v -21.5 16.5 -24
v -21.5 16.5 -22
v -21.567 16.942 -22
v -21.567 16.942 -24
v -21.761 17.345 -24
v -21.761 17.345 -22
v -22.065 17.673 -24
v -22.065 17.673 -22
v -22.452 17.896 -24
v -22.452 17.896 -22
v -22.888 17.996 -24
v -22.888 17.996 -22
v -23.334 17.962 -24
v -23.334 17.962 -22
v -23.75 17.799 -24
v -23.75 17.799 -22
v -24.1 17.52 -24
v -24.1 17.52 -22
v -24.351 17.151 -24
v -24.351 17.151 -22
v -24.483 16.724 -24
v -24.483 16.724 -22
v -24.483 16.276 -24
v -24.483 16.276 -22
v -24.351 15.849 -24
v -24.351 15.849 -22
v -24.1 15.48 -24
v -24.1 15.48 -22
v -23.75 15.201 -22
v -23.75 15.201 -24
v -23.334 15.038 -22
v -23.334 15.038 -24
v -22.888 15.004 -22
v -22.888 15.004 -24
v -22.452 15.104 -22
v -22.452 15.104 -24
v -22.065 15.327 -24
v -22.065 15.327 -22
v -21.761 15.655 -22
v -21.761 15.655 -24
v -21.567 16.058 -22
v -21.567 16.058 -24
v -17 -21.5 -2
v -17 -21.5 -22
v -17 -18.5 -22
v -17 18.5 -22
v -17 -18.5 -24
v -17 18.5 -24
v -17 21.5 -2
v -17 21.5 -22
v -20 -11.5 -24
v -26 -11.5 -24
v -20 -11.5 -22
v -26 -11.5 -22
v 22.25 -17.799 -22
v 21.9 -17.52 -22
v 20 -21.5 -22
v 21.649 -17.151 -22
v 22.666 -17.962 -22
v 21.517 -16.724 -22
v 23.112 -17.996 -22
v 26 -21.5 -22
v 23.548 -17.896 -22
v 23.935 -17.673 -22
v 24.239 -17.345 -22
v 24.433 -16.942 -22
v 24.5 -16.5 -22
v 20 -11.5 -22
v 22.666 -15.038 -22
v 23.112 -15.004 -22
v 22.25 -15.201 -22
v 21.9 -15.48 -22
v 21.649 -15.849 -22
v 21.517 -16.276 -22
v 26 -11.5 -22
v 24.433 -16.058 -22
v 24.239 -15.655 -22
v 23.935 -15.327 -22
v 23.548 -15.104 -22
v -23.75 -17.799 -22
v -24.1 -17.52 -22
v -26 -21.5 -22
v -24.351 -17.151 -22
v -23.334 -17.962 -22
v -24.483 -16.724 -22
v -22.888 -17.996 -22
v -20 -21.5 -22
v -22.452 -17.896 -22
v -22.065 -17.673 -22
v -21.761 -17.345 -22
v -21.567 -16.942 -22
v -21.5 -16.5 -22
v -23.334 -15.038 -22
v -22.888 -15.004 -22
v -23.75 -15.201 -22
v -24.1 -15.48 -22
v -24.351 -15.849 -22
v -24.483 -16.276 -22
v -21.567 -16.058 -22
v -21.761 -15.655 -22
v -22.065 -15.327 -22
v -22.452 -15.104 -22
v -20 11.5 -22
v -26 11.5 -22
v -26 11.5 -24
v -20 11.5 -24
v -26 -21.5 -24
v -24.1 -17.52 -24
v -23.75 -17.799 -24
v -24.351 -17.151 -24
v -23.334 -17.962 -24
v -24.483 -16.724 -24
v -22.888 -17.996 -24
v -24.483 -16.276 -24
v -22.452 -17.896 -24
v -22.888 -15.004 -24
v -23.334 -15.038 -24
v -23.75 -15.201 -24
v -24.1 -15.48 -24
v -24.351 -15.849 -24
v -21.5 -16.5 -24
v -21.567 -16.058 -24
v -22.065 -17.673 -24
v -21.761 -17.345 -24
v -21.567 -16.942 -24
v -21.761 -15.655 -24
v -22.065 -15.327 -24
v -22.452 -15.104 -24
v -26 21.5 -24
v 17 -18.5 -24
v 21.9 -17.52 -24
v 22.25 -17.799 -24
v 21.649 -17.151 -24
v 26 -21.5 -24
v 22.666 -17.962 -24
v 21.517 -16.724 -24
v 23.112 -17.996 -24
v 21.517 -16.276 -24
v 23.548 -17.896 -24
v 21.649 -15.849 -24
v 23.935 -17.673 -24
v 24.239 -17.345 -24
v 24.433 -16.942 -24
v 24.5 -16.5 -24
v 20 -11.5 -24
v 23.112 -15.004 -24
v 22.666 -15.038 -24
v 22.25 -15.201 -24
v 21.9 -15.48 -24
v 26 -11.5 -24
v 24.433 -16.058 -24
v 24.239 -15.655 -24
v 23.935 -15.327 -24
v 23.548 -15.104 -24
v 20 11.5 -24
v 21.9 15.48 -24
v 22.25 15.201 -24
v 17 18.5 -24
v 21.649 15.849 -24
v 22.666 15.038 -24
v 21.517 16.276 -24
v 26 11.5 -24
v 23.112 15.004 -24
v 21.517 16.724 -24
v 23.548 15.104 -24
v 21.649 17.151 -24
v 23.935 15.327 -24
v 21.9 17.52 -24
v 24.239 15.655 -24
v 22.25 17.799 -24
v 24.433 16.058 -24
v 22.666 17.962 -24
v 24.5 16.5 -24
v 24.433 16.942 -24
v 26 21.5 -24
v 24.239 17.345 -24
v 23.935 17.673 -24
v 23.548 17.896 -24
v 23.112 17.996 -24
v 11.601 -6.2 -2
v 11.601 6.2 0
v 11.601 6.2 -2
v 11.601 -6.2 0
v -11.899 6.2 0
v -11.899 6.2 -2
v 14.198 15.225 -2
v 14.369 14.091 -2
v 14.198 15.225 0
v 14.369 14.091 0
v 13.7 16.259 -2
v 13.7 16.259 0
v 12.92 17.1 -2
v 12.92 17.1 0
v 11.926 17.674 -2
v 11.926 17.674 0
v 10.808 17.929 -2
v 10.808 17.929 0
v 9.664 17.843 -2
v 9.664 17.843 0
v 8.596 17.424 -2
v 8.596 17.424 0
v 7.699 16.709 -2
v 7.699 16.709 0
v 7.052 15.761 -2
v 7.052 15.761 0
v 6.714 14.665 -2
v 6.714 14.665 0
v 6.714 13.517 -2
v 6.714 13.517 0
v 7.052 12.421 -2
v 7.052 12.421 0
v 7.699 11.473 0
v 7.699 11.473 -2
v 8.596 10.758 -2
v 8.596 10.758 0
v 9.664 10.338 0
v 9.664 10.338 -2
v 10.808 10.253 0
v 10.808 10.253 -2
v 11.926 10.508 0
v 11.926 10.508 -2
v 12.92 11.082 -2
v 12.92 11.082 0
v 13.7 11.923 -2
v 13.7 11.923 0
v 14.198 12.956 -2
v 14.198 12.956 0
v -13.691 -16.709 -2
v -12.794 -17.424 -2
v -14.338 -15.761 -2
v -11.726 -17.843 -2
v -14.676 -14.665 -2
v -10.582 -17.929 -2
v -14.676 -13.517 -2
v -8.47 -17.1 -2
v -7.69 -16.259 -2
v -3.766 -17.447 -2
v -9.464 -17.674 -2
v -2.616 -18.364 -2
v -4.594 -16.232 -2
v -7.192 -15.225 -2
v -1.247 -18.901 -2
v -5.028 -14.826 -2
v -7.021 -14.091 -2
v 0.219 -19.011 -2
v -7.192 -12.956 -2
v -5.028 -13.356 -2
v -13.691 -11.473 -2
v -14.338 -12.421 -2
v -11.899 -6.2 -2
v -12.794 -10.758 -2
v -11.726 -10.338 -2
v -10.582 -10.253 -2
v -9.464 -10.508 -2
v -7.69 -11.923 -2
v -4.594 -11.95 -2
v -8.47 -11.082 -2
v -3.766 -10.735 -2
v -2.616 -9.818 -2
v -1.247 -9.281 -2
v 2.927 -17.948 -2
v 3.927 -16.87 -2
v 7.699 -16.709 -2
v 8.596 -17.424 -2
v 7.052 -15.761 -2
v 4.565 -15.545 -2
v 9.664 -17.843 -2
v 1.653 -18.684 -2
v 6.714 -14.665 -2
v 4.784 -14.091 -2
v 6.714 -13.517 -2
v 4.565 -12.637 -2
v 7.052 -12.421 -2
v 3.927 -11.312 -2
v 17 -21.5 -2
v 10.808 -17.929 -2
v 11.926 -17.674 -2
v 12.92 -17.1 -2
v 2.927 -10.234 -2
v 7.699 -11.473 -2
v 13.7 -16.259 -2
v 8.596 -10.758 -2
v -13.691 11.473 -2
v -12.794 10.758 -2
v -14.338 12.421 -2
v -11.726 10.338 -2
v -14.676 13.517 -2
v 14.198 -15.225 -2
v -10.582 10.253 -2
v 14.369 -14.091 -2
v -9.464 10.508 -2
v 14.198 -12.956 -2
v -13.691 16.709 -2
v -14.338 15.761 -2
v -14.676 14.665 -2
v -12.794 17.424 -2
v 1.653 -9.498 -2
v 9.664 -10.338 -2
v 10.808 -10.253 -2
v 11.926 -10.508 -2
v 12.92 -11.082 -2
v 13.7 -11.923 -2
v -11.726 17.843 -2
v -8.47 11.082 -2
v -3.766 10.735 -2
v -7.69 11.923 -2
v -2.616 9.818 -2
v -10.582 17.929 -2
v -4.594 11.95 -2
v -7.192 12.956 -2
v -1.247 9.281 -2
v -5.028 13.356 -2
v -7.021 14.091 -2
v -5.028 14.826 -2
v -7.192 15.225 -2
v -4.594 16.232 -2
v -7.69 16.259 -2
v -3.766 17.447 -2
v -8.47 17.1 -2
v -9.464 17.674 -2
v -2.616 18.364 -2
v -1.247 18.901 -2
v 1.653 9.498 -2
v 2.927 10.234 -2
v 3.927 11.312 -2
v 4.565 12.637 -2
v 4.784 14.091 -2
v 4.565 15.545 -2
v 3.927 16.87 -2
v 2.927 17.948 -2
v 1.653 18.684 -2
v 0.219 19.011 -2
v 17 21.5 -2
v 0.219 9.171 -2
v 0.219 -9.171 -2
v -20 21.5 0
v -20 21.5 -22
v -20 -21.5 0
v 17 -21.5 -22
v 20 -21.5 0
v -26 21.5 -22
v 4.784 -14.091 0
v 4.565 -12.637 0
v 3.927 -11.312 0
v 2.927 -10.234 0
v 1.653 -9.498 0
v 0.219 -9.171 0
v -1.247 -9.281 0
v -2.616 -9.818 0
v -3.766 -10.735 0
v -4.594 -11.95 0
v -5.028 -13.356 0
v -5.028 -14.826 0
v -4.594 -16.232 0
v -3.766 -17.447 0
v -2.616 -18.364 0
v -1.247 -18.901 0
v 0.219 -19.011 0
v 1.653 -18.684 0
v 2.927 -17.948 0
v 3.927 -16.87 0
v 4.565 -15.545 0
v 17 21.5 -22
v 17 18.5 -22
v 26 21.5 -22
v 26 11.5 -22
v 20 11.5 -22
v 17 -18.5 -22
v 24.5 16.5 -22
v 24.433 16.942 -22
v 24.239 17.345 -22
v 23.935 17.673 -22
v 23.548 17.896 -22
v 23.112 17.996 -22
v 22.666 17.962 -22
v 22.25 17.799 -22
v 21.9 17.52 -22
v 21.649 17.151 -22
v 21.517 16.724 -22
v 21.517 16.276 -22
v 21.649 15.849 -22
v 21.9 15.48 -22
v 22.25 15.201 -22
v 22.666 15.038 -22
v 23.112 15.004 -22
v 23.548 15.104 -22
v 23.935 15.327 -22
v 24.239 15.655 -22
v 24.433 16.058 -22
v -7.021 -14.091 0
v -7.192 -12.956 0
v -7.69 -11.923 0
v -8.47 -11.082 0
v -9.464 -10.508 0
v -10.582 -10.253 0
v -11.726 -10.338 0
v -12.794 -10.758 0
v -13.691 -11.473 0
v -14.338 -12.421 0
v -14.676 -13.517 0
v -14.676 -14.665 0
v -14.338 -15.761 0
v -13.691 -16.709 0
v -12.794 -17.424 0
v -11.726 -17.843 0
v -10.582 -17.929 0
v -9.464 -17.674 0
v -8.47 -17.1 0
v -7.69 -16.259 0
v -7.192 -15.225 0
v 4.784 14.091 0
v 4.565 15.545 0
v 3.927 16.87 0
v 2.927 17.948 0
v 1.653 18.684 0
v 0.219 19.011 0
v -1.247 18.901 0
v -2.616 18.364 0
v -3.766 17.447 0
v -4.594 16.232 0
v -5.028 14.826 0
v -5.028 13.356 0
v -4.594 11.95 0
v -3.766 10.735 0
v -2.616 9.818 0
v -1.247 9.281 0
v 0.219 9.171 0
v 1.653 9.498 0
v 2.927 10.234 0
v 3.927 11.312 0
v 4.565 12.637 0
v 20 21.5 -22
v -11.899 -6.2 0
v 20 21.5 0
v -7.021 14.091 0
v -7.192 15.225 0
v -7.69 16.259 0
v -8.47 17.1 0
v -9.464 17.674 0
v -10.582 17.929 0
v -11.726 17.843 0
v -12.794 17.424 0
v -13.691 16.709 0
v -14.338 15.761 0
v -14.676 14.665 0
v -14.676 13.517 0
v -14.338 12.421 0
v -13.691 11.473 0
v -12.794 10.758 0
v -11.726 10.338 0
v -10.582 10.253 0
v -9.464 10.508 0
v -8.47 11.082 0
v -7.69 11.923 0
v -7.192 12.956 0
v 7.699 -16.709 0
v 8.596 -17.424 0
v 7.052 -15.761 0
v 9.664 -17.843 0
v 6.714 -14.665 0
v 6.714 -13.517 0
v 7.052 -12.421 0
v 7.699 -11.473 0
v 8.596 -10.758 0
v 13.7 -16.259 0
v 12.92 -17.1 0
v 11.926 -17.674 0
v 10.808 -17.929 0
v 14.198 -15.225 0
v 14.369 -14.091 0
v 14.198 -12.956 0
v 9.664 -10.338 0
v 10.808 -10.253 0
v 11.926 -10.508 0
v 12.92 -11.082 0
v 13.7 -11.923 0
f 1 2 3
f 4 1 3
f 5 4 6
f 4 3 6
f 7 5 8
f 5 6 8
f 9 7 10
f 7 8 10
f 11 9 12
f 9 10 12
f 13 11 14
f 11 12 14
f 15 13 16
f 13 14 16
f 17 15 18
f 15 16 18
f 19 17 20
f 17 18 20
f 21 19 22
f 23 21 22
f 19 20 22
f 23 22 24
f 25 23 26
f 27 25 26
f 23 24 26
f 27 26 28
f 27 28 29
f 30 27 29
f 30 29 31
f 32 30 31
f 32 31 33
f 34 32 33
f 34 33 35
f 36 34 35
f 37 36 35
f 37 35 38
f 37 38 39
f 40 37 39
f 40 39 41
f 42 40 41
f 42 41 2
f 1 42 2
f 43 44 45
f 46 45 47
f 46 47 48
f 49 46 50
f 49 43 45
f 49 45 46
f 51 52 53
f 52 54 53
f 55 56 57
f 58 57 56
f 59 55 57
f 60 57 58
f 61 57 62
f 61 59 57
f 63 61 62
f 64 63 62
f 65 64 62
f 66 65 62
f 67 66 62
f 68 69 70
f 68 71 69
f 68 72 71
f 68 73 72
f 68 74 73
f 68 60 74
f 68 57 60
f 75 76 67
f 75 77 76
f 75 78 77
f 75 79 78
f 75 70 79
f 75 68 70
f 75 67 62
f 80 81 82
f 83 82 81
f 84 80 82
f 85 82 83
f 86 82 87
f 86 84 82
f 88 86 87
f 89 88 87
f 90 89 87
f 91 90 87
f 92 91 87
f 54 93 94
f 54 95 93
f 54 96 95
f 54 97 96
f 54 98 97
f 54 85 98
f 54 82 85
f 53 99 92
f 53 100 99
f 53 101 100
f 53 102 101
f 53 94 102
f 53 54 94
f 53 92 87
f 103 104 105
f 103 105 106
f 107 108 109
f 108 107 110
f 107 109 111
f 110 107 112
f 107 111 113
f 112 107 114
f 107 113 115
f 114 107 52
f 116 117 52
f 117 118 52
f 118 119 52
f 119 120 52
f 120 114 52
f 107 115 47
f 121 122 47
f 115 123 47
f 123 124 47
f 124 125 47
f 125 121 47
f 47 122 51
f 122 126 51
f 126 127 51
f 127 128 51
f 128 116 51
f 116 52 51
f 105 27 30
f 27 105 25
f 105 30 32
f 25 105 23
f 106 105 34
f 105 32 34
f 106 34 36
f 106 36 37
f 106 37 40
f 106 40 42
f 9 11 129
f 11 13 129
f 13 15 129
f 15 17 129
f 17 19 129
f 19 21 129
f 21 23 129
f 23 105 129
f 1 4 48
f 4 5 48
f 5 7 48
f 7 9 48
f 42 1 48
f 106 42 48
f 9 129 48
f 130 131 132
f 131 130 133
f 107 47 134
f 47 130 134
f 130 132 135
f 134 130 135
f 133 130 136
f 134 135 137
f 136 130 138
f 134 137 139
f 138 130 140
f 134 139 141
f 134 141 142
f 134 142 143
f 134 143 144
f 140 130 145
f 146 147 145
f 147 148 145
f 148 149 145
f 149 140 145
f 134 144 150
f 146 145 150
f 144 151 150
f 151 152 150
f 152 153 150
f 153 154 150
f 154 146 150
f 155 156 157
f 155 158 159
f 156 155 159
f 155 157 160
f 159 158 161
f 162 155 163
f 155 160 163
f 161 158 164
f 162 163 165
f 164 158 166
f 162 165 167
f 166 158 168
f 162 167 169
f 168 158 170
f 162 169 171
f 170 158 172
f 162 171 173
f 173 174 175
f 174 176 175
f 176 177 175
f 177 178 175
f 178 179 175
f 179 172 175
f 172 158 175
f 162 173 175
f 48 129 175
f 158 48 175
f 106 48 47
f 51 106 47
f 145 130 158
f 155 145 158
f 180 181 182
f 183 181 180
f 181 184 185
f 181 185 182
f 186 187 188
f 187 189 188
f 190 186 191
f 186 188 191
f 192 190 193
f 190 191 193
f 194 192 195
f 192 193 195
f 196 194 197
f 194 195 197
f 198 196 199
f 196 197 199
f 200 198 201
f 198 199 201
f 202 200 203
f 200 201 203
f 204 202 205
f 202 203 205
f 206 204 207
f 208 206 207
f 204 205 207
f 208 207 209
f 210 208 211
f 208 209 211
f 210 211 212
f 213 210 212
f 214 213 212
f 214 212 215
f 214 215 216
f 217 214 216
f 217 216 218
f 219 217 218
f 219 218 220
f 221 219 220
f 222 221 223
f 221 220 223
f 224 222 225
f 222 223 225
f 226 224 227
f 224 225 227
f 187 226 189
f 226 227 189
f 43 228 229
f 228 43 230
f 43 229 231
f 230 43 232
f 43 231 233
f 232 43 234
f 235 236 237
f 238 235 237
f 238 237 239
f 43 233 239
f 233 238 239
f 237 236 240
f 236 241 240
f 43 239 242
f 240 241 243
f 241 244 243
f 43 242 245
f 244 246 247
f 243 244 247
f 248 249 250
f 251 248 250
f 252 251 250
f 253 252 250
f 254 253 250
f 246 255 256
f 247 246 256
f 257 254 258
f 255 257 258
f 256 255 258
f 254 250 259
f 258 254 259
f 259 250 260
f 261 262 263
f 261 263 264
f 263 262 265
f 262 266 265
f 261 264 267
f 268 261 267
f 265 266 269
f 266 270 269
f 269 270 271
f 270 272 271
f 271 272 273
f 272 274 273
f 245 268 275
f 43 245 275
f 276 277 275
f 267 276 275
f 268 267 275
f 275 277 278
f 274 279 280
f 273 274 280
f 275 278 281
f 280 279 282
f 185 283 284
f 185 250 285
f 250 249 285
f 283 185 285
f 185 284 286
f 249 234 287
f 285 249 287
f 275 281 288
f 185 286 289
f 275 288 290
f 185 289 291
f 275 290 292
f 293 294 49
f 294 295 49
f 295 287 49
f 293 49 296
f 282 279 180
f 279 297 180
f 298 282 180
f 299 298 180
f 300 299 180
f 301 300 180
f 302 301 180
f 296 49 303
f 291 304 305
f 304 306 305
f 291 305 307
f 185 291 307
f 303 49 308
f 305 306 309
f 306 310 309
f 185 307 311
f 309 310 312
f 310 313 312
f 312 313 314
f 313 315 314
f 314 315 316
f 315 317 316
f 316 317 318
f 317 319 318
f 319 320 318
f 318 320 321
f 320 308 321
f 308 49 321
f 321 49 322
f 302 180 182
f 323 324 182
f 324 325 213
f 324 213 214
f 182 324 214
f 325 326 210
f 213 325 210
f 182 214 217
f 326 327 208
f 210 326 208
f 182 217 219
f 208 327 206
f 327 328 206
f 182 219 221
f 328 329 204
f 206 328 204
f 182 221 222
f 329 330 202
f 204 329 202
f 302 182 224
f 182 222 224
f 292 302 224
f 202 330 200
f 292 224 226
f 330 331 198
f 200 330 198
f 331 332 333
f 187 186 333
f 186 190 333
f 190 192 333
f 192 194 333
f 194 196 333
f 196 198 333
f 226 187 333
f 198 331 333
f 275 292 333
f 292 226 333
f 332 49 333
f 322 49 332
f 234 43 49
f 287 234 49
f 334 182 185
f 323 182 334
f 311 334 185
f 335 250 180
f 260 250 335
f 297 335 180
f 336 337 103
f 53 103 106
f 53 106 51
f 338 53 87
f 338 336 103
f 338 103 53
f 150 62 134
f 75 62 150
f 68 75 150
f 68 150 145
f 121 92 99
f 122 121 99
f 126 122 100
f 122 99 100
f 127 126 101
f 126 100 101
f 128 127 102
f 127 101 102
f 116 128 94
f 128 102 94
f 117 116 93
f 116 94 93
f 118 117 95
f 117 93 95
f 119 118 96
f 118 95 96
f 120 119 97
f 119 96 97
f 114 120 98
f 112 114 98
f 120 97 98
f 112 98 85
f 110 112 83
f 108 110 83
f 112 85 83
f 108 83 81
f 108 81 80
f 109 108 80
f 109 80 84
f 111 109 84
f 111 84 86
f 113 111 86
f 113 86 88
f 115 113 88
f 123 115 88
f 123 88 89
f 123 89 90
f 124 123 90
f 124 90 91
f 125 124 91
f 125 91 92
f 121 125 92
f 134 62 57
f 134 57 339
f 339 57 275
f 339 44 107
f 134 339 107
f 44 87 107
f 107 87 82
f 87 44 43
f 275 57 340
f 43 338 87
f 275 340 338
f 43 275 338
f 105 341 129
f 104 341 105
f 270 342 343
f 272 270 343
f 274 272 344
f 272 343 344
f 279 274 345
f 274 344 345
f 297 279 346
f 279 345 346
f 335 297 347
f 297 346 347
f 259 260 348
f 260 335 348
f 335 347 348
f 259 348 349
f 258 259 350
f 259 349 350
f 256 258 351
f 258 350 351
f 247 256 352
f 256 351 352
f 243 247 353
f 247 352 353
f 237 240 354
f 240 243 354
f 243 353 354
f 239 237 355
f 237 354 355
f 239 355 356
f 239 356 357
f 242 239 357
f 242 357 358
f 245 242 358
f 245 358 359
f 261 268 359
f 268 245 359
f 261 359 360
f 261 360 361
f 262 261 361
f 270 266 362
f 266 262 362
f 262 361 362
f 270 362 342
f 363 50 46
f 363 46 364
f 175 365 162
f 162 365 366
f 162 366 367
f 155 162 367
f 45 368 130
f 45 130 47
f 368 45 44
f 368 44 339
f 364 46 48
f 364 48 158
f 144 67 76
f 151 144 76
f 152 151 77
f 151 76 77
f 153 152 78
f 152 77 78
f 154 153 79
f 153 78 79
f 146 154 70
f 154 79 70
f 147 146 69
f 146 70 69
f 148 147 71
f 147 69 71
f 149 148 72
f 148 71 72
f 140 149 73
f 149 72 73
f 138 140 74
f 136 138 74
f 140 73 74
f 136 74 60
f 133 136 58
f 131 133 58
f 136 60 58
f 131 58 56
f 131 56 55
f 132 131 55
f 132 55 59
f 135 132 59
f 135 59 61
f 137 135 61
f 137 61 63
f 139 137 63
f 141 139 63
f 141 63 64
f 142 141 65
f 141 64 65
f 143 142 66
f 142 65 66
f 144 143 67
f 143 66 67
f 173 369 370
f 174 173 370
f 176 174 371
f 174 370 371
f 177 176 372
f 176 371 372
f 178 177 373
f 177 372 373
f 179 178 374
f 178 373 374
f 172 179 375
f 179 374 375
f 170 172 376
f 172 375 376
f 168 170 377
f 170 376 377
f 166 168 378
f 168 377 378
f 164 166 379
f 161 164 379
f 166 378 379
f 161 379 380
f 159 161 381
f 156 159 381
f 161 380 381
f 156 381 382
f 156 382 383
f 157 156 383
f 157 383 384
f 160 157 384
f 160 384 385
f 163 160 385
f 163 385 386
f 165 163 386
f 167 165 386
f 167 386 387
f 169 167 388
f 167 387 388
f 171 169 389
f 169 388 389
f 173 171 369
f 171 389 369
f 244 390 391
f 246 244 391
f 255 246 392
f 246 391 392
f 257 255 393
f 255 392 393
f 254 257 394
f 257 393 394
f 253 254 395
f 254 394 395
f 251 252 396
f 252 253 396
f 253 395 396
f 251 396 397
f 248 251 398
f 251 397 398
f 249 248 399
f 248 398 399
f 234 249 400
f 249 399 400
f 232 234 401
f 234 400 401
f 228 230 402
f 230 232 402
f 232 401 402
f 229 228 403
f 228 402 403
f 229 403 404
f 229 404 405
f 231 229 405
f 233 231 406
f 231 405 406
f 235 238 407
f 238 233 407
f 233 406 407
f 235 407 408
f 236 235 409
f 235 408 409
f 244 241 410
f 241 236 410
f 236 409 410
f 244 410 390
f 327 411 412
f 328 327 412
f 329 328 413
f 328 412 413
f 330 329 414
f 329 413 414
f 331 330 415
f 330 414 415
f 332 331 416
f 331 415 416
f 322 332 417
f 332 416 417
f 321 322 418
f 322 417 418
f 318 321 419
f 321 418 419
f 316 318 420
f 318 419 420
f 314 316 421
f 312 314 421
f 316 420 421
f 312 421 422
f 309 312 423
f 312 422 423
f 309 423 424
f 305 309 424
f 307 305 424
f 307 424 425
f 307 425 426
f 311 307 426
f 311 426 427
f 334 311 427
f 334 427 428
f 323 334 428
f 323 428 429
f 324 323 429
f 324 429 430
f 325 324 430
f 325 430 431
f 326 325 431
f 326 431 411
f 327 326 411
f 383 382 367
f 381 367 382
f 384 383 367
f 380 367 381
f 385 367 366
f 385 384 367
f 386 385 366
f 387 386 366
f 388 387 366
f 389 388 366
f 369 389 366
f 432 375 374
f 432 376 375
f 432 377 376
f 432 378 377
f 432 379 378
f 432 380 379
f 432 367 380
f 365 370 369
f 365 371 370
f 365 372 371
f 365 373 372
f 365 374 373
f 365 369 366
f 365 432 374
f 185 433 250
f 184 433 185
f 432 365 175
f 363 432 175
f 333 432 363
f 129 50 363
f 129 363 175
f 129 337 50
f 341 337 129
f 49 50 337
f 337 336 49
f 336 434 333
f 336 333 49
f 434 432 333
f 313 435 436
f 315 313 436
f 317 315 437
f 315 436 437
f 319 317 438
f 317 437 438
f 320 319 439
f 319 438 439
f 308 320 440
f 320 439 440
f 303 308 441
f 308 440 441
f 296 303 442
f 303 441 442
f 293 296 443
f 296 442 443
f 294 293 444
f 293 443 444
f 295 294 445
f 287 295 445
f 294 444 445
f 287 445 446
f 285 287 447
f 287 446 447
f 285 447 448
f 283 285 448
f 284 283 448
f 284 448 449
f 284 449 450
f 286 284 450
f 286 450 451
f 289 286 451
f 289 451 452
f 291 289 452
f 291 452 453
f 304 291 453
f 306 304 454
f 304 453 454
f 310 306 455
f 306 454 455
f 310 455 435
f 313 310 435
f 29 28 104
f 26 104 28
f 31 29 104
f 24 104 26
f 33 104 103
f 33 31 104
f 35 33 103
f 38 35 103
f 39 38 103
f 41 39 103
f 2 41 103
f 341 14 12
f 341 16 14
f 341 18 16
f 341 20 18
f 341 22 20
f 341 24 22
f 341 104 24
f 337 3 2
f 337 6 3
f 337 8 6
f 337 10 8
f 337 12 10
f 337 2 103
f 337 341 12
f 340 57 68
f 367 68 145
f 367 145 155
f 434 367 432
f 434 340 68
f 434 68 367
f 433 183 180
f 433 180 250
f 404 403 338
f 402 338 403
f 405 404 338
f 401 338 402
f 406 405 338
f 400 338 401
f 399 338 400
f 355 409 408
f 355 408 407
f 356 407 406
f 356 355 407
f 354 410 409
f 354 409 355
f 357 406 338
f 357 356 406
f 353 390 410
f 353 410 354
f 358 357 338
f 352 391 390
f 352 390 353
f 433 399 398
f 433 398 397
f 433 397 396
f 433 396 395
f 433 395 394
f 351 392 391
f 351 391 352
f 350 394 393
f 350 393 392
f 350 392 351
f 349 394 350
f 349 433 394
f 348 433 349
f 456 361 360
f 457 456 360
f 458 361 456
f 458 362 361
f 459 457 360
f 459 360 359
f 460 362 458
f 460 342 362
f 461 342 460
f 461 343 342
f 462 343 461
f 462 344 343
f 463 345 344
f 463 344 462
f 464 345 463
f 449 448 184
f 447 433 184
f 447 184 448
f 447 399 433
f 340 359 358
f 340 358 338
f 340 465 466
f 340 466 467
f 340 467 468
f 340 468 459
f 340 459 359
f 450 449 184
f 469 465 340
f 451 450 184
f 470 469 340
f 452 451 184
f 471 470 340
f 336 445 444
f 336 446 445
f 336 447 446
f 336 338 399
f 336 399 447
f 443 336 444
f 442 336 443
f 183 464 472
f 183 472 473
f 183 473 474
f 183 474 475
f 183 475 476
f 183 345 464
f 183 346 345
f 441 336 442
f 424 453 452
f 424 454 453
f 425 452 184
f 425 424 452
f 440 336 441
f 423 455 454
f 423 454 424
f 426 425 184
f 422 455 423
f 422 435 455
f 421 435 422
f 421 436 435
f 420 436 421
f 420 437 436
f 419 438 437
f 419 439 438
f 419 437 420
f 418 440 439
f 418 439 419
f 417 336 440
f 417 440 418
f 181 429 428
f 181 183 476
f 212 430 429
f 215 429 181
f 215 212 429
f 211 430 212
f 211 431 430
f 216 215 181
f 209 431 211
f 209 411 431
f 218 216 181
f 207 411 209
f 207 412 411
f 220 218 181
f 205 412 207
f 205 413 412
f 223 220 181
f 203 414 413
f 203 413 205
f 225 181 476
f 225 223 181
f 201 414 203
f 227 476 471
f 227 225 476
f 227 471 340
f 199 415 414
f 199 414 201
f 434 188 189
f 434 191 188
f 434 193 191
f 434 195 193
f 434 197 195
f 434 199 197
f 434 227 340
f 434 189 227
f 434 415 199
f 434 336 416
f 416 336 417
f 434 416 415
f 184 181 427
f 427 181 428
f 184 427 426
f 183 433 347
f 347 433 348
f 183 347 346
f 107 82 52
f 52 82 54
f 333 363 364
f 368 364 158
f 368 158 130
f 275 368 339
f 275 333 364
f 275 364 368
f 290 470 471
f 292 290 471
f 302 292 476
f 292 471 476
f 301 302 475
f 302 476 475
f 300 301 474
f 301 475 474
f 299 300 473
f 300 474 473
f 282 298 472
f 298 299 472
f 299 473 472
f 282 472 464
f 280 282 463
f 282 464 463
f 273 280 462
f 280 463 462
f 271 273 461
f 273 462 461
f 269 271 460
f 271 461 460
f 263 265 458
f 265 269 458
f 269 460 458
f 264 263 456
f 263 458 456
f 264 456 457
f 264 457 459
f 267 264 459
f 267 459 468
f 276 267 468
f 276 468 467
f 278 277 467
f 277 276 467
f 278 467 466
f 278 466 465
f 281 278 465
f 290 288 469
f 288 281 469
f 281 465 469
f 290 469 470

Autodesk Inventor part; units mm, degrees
ref_plane "YZ Plane" through (0, 0, 0) normal (1, 0, 0) x (0, 1, 0)
ref_plane "XZ Plane" through (0, 0, 0) normal (0, 1, 0) x (-1, 0, 0)
sketch "Block1_1" plane through (0, 0, 0) normal (0, 0, 1) x (1, 0, 0)
  circle A0 centre (47.029, 24.2723) radius 1.1
  circle A1 centre (75.029, 24.2723) radius 1.1
  line L0 (49.279, 30.4723) -> (72.779, 30.4723)
  line L1 (72.779, 30.4723) -> (72.779, 18.0723)
  line L2 (72.779, 18.0723) -> (49.279, 18.0723)
  line L3 (49.279, 18.0723) -> (49.279, 30.4723)
  line L4 (49.279, 30.4723) -> (44.779, 30.4723)
  line L5 (44.779, 30.4723) -> (44.779, 18.0723)
  line L6 (44.779, 18.0723) -> (49.279, 18.0723)
  line L7 (49.279, 18.0723) -> (49.279, 30.4723)
  line L8 (72.779, 30.4723) -> (77.279, 30.4723)
  line L9 (77.279, 30.4723) -> (77.279, 18.0723)
  line L10 (77.279, 18.0723) -> (72.779, 18.0723)
  line L11 (72.779, 18.0723) -> (72.779, 30.4723)
  line L12 (44.779, 24.2723) -> (77.279, 24.2723) construction
  line L13 (61.029, 30.4723) -> (61.029, 18.0723) construction
  line L14 (47.029, 30.4723) -> (47.029, 18.0723) construction
  line L15 (75.029, 30.4723) -> (75.029, 18.0723) construction
  line L16 (66.779, 30.4723) -> (66.779, 18.0723) construction
  point P0 (60.979, 24.0984)
  dimension "d2" = 23.5
  dimension "d3" = 12.4
  dimension "d4" = 4.5
  dimension "d5" = 4.5
  dimension "d6" = 2.2
  dimension "d7" = 2.2
  dimension "d8" = 2.25
  dimension "d9" = 6
sketch "Sketch1" plane through (0, 0, 0) normal (0, 0, 1) x (1, 0, 0)
  line L0 (-20, 21.5) -> (20, 21.5)
  line L1 (20, 21.5) -> (20, -21.5)
  line L2 (20, -21.5) -> (-20, -21.5)
  line L3 (-20, -21.5) -> (-20, 21.5)
  line L4 (-0.1493, 33.2365) -> (-0.1493, -35.4112) construction
  line L5 (-27.052, 0) -> (29.4139, 0) construction
  line L6 (20, 21.5) -> (17, 21.5)
  line L7 (17, 21.5) -> (17, -21.5)
  line L8 (17, -21.5) -> (20, -21.5)
  line L9 (20, -21.5) -> (20, 21.5)
  line L10 (-20, 21.5) -> (-17, 21.5)
  line L11 (-17, 21.5) -> (-17, -21.5)
  line L12 (-17, -21.5) -> (-20, -21.5)
  line L13 (-20, -21.5) -> (-20, 21.5)
  line L14 (-20, 21.5) -> (20, 21.5)
  line L15 (20, 21.5) -> (20, -21.5)
  line L16 (20, -21.5) -> (-20, -21.5)
  line L17 (-20, -21.5) -> (-20, 21.5)
  circle A0 centre (-0.1493, 14.0909) radius 4.9337
  circle A1 centre (10.5202, 14.0909) radius 3.8489
  circle A2 centre (-10.8699, 14.0909) radius 3.8489
  circle A3 centre (-14.1493, 0) radius 1.1
  circle A4 centre (13.8507, 0) radius 1.1
  line L18 (-11.8993, 6.2) -> (11.6007, 6.2)
  line L19 (11.6007, 6.2) -> (11.6007, -6.2)
  line L20 (11.6007, -6.2) -> (-11.8993, -6.2)
  line L21 (-11.8993, -6.2) -> (-11.8993, 6.2)
  line L22 (-11.8993, 6.2) -> (-16.3993, 6.2)
  line L23 (-16.3993, 6.2) -> (-16.3993, -6.2)
  line L24 (-16.3993, -6.2) -> (-11.8993, -6.2)
  line L25 (-11.8993, -6.2) -> (-11.8993, 6.2)
  line L26 (11.6007, 6.2) -> (16.1007, 6.2)
  line L27 (16.1007, 6.2) -> (16.1007, -6.2)
  line L28 (16.1007, -6.2) -> (11.6007, -6.2)
  line L29 (11.6007, -6.2) -> (11.6007, 6.2)
  line L30 (-16.3993, 0) -> (16.1007, 0) construction
  line L31 (-0.1493, 6.2) -> (-0.1493, -6.2) construction
  line L32 (-14.1493, 6.2) -> (-14.1493, -6.2) construction
  line L33 (13.8507, 6.2) -> (13.8507, -6.2) construction
  line L34 (5.6007, 6.2) -> (5.6007, -6.2) construction
  point P0 (0, 0)
  point P1 (-20, 0)
  point P2 (0, -21.5)
  dimension "d0" = 40
  dimension "d1" = 43
  dimension "d10" = 3
  dimension "d11" = 3
extrude "Extrusion1" add sketch "Sketch1" against normal blind 2 contours L0 L7 L2 L11 | A0 | A1 | A2 | A3 | A4 | L21 L24 L23 L22 | L26 L27 L28 L19
extrude "Extrusion2" add sketch "Sketch1" against normal blind 22 contours L0 L11 L2 L3 | L0 L1 L2 L7
ref_plane "Work Plane1" through (0, 0, -22) normal (0, 0, 1) x (1, 0, 0)
sketch "Sketch2" plane through (0, 0, -22) normal (0, 0, 1) x (1, 0, 0)
  line L0 (-11.8993, 6.2) -> (11.6007, 6.2) projected
  line L1 (11.6007, -6.2) -> (-11.8993, -6.2) projected
  line L2 (20, 21.5) -> (-20, 21.5) projected
  line L3 (-20, 21.5) -> (-20, -21.5) projected
  line L4 (-20, -21.5) -> (20, -21.5) projected
  line L5 (20, -21.5) -> (20, 21.5) projected
  line L6 (-17, 18.5) -> (17, 18.5)
  line L7 (17, 18.5) -> (17, -18.5)
  line L8 (17, -18.5) -> (-17, -18.5)
  line L9 (-17, -18.5) -> (-17, 18.5)
  line L10 (20, 21.5) -> (26, 21.5)
  line L11 (26, 21.5) -> (26, 11.5)
  line L12 (26, 11.5) -> (20, 11.5)
  line L13 (20, 11.5) -> (20, 21.5)
  line L14 (20, -21.5) -> (26, -21.5)
  line L15 (26, -21.5) -> (26, -11.5)
  line L16 (26, -11.5) -> (20, -11.5)
  line L17 (20, -11.5) -> (20, -21.5)
  line L18 (-20, 21.5) -> (-26, 21.5)
  line L19 (-26, 21.5) -> (-26, 11.5)
  line L20 (-26, 11.5) -> (-20, 11.5)
  line L21 (-20, 11.5) -> (-20, 21.5)
  line L22 (-20, -21.5) -> (-26, -21.5)
  line L23 (-26, -21.5) -> (-26, -11.5)
  line L24 (-26, -11.5) -> (-20, -11.5)
  line L25 (-20, -11.5) -> (-20, -21.5)
  circle A0 centre (-23, 16.5) radius 1.5
  circle A1 centre (-23, -16.5) radius 1.5
  circle A2 centre (23, 16.5) radius 1.5
  circle A3 centre (23, -16.5) radius 1.5
  line L26 (-11.8993, -6.2) -> (-11.8993, 6.2) projected
  line L27 (11.6007, 6.2) -> (11.6007, -6.2) projected
  point P0 (0, 0)
  dimension "d17" = 3
  dimension "d22" = 6
  dimension "d23" = 10
  dimension "d24" = 6
  dimension "d25" = 10
  dimension "d26" = 6
  dimension "d27" = 10
  dimension "d28" = 6
  dimension "d29" = 10
  dimension "d30" = 3
  dimension "d31" = 3
  dimension "d32" = 3
  dimension "d33" = 3
extrude "Extrusion3" add sketch "Sketch2" against normal blind 2 contours L5 L4 L3 L2
extrude "Extrusion4" cut sketch "Sketch1" against normal blind 2 contours A0 | A1 | A2
mirror "Mirror1" about plane through (0, 0, 0) normal (0, 1, 0) of "Extrusion4"
extrude "Extrusion5" add sketch "Sketch2" against normal blind 2 contours L10 L11 L12 L5 | L3 L20 L19 L18 | L16 L15 L14 L5 | L3 L22 L23 L24
properties part number "ServoHolder"
